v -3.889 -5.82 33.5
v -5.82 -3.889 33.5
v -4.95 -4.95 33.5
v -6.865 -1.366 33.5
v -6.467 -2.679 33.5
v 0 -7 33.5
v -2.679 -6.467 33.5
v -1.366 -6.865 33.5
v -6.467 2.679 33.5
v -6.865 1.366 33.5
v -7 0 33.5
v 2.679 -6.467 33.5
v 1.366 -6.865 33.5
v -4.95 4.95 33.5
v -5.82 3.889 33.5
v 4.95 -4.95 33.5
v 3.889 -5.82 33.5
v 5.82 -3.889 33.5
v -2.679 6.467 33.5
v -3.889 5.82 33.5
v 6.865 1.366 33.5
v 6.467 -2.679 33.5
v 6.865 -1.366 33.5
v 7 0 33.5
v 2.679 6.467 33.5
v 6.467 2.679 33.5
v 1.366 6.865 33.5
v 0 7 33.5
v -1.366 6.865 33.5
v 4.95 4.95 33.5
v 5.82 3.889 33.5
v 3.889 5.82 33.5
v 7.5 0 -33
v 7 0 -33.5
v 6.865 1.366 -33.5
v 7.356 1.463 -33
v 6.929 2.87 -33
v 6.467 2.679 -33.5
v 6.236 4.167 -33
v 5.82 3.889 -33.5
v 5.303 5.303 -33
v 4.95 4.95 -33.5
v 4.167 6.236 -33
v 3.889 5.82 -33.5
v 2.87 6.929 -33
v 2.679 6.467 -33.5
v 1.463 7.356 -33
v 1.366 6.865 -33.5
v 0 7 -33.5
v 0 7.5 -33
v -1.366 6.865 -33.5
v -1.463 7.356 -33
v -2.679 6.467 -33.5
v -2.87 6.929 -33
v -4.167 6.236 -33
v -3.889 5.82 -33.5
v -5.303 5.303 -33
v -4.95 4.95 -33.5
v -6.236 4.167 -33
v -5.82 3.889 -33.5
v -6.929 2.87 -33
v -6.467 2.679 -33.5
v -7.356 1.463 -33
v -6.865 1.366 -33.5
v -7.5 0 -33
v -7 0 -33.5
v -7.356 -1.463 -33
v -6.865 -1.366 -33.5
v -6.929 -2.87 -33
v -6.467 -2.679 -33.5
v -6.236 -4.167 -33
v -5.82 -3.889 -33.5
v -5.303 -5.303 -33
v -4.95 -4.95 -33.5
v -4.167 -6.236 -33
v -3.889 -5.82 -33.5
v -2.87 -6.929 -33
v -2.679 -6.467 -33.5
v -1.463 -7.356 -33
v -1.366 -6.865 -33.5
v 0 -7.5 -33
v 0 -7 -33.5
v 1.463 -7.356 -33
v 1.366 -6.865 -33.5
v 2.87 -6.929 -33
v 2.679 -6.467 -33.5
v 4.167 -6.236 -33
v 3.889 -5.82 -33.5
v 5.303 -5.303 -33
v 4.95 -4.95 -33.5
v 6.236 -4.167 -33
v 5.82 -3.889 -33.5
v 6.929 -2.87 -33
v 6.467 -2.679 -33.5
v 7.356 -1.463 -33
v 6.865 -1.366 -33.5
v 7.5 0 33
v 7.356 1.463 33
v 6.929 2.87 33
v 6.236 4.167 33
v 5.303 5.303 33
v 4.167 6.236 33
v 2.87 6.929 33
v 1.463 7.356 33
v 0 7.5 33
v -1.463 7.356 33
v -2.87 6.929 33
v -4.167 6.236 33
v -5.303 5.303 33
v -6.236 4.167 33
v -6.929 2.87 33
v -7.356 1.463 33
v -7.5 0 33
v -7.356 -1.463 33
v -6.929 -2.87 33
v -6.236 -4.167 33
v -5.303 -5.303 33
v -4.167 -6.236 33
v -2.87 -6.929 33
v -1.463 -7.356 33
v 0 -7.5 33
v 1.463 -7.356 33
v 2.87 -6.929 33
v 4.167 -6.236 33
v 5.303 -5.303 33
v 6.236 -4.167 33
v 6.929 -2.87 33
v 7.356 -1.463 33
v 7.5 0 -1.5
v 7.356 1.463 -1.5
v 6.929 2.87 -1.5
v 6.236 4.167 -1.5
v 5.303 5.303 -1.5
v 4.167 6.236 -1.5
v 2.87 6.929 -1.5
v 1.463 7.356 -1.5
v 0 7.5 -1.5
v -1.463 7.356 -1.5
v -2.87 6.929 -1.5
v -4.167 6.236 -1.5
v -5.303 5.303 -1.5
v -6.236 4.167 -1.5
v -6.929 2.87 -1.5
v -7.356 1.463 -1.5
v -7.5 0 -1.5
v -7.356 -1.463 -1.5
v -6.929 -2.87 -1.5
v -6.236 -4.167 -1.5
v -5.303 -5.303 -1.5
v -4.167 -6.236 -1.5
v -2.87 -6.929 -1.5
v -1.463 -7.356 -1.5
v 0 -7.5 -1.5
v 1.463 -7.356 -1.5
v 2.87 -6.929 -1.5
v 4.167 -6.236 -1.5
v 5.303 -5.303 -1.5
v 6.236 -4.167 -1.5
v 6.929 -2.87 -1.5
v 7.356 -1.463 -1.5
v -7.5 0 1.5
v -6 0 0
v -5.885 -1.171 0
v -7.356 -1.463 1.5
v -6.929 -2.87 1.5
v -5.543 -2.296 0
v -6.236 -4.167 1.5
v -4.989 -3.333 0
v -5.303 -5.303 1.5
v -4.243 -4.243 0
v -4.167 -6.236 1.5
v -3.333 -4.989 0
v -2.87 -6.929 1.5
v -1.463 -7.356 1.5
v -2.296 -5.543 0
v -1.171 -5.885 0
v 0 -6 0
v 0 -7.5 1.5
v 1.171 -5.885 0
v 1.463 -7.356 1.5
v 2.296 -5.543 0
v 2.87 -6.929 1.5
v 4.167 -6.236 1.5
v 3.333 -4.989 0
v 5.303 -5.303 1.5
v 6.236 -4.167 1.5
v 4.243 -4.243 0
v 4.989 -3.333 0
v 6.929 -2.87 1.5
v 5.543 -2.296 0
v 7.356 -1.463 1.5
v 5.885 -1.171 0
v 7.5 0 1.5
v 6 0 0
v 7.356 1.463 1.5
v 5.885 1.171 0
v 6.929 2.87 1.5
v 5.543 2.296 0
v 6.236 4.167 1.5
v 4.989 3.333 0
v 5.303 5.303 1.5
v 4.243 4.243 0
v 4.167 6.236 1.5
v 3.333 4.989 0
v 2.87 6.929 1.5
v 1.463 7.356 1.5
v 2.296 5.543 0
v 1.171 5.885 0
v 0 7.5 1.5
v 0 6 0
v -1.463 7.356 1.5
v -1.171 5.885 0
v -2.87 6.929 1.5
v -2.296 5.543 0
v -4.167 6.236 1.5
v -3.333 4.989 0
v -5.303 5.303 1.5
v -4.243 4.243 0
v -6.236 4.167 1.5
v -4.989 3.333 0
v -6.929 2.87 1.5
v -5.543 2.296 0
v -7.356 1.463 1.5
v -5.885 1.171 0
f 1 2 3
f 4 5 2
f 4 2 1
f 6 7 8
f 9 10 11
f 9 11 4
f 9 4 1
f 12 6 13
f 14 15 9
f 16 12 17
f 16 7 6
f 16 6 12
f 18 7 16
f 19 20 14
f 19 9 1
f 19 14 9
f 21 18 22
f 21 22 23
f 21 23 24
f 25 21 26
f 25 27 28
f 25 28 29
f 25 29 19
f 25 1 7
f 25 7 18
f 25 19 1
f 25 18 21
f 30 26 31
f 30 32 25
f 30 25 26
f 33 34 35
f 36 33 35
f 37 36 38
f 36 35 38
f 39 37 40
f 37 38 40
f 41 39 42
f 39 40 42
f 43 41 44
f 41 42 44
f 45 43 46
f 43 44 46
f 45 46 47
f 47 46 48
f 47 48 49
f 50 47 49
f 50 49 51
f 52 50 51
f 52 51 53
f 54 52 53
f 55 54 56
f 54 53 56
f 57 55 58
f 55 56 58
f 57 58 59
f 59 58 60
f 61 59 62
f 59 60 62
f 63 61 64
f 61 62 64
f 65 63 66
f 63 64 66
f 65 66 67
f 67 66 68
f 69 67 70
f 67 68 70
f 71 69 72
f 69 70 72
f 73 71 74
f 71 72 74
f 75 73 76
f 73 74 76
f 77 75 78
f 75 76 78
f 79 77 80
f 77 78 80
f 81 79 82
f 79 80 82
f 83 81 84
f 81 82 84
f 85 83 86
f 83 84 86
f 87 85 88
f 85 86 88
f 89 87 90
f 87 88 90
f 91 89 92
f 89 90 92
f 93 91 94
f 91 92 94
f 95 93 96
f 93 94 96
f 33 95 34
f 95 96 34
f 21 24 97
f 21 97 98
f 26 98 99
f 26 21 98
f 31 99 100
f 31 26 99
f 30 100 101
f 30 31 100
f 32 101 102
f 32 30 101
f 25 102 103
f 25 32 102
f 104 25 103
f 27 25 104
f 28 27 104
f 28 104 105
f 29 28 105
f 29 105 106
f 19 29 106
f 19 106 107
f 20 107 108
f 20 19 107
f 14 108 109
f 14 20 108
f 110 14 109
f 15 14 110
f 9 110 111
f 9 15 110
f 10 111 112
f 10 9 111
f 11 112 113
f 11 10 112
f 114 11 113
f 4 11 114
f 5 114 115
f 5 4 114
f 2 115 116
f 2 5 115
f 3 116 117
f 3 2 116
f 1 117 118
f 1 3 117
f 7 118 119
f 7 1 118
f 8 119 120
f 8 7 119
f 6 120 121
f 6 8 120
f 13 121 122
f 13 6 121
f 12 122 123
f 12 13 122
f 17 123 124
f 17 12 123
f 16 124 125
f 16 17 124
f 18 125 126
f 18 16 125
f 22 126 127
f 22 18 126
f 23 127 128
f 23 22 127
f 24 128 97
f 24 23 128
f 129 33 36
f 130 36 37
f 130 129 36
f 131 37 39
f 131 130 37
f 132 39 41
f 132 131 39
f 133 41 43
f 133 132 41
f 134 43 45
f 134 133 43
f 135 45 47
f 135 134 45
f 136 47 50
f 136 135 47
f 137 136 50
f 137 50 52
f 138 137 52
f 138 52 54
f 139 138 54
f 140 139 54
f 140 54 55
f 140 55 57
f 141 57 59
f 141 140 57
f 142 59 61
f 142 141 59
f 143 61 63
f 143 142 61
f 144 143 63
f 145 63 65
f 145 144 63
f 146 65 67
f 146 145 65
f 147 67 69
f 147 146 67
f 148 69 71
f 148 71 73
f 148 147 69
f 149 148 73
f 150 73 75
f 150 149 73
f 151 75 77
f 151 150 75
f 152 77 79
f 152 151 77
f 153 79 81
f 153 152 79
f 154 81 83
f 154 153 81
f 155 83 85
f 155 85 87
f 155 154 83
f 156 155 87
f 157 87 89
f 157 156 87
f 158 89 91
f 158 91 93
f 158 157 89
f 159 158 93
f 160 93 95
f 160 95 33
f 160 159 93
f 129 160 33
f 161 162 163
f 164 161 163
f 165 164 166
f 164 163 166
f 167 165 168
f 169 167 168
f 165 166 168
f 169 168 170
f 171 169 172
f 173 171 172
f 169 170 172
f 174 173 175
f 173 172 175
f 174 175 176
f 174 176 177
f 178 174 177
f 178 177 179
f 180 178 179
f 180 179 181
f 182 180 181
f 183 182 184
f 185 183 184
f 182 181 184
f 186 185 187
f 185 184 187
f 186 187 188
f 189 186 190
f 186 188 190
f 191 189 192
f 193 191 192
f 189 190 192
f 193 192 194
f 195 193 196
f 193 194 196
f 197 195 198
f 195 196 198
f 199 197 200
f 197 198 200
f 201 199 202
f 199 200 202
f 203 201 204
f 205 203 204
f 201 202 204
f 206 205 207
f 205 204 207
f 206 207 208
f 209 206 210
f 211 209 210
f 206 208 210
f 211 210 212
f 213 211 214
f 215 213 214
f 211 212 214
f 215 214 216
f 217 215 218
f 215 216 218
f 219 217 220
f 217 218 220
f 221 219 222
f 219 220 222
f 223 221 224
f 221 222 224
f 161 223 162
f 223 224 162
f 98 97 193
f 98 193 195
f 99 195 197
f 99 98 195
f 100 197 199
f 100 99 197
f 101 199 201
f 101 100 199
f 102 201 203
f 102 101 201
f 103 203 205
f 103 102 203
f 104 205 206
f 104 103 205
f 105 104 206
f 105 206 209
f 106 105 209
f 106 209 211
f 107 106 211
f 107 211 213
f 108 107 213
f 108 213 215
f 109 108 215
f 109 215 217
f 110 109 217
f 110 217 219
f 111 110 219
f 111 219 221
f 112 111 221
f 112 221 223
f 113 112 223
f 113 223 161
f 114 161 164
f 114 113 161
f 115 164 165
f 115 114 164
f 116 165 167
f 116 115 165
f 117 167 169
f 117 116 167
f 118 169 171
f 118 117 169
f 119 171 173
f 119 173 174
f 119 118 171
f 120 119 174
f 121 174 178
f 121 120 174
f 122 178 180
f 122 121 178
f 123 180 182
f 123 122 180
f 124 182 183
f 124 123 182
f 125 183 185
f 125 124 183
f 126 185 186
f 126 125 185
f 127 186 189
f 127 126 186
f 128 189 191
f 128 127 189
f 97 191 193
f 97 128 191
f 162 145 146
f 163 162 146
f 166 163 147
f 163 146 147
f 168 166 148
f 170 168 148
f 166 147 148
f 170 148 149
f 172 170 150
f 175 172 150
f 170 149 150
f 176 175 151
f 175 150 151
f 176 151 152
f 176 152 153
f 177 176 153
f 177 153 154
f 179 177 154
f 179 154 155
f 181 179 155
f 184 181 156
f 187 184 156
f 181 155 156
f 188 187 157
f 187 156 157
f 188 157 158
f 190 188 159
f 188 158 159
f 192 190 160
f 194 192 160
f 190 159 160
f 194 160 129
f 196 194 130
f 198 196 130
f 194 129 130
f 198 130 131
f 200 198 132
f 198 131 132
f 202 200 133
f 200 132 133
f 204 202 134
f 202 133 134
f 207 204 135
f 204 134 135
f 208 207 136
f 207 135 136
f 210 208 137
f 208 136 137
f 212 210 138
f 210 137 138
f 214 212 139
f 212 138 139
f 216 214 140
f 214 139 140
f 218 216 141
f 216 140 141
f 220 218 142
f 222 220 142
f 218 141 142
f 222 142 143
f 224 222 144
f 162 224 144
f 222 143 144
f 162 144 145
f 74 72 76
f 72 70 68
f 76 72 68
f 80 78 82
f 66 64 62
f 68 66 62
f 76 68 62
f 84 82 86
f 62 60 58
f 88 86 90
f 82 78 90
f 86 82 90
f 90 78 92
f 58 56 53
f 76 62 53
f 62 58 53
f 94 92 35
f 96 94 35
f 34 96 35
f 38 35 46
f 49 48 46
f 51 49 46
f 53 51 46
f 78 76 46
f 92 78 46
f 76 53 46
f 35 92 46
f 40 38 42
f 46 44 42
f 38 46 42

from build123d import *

# Parameters (mm, degrees)
DIA_CYLINDRE_R = 7.5
CYLINDRE_DEPTH = 33.5
CHANFREIN_SIZE = 0.5


with BuildPart() as part:
    # Dia cylindre → Cylindre (new body, symmetric)
    with BuildSketch(Plane.XY):
        Circle(DIA_CYLINDRE_R)
    extrude(amount=CYLINDRE_DEPTH, both=True)

    # Chanfrein
    chanfrein_edges = [part.edges().sort_by_distance(p)[0] for p in [
        (-7.5, 0, -33.5),
        (-7.5, 0, 33.5),
    ]]
    chamfer(chanfrein_edges, length=CHANFREIN_SIZE)

    # Profil rainure → Rainure (revolve, cut)
    with BuildSketch(Plane(origin=(0, 0, 0), x_dir=(1, 0, 0), z_dir=(0, 1, 0))):
        Polygon((-7.5, 1.5), (-7.5, -1.5), (-6, 0), align=None)
    revolve(axis=Axis((0, 0, -36.430134701), (0, 0, 1)), mode=Mode.SUBTRACT)


solid = part.part
